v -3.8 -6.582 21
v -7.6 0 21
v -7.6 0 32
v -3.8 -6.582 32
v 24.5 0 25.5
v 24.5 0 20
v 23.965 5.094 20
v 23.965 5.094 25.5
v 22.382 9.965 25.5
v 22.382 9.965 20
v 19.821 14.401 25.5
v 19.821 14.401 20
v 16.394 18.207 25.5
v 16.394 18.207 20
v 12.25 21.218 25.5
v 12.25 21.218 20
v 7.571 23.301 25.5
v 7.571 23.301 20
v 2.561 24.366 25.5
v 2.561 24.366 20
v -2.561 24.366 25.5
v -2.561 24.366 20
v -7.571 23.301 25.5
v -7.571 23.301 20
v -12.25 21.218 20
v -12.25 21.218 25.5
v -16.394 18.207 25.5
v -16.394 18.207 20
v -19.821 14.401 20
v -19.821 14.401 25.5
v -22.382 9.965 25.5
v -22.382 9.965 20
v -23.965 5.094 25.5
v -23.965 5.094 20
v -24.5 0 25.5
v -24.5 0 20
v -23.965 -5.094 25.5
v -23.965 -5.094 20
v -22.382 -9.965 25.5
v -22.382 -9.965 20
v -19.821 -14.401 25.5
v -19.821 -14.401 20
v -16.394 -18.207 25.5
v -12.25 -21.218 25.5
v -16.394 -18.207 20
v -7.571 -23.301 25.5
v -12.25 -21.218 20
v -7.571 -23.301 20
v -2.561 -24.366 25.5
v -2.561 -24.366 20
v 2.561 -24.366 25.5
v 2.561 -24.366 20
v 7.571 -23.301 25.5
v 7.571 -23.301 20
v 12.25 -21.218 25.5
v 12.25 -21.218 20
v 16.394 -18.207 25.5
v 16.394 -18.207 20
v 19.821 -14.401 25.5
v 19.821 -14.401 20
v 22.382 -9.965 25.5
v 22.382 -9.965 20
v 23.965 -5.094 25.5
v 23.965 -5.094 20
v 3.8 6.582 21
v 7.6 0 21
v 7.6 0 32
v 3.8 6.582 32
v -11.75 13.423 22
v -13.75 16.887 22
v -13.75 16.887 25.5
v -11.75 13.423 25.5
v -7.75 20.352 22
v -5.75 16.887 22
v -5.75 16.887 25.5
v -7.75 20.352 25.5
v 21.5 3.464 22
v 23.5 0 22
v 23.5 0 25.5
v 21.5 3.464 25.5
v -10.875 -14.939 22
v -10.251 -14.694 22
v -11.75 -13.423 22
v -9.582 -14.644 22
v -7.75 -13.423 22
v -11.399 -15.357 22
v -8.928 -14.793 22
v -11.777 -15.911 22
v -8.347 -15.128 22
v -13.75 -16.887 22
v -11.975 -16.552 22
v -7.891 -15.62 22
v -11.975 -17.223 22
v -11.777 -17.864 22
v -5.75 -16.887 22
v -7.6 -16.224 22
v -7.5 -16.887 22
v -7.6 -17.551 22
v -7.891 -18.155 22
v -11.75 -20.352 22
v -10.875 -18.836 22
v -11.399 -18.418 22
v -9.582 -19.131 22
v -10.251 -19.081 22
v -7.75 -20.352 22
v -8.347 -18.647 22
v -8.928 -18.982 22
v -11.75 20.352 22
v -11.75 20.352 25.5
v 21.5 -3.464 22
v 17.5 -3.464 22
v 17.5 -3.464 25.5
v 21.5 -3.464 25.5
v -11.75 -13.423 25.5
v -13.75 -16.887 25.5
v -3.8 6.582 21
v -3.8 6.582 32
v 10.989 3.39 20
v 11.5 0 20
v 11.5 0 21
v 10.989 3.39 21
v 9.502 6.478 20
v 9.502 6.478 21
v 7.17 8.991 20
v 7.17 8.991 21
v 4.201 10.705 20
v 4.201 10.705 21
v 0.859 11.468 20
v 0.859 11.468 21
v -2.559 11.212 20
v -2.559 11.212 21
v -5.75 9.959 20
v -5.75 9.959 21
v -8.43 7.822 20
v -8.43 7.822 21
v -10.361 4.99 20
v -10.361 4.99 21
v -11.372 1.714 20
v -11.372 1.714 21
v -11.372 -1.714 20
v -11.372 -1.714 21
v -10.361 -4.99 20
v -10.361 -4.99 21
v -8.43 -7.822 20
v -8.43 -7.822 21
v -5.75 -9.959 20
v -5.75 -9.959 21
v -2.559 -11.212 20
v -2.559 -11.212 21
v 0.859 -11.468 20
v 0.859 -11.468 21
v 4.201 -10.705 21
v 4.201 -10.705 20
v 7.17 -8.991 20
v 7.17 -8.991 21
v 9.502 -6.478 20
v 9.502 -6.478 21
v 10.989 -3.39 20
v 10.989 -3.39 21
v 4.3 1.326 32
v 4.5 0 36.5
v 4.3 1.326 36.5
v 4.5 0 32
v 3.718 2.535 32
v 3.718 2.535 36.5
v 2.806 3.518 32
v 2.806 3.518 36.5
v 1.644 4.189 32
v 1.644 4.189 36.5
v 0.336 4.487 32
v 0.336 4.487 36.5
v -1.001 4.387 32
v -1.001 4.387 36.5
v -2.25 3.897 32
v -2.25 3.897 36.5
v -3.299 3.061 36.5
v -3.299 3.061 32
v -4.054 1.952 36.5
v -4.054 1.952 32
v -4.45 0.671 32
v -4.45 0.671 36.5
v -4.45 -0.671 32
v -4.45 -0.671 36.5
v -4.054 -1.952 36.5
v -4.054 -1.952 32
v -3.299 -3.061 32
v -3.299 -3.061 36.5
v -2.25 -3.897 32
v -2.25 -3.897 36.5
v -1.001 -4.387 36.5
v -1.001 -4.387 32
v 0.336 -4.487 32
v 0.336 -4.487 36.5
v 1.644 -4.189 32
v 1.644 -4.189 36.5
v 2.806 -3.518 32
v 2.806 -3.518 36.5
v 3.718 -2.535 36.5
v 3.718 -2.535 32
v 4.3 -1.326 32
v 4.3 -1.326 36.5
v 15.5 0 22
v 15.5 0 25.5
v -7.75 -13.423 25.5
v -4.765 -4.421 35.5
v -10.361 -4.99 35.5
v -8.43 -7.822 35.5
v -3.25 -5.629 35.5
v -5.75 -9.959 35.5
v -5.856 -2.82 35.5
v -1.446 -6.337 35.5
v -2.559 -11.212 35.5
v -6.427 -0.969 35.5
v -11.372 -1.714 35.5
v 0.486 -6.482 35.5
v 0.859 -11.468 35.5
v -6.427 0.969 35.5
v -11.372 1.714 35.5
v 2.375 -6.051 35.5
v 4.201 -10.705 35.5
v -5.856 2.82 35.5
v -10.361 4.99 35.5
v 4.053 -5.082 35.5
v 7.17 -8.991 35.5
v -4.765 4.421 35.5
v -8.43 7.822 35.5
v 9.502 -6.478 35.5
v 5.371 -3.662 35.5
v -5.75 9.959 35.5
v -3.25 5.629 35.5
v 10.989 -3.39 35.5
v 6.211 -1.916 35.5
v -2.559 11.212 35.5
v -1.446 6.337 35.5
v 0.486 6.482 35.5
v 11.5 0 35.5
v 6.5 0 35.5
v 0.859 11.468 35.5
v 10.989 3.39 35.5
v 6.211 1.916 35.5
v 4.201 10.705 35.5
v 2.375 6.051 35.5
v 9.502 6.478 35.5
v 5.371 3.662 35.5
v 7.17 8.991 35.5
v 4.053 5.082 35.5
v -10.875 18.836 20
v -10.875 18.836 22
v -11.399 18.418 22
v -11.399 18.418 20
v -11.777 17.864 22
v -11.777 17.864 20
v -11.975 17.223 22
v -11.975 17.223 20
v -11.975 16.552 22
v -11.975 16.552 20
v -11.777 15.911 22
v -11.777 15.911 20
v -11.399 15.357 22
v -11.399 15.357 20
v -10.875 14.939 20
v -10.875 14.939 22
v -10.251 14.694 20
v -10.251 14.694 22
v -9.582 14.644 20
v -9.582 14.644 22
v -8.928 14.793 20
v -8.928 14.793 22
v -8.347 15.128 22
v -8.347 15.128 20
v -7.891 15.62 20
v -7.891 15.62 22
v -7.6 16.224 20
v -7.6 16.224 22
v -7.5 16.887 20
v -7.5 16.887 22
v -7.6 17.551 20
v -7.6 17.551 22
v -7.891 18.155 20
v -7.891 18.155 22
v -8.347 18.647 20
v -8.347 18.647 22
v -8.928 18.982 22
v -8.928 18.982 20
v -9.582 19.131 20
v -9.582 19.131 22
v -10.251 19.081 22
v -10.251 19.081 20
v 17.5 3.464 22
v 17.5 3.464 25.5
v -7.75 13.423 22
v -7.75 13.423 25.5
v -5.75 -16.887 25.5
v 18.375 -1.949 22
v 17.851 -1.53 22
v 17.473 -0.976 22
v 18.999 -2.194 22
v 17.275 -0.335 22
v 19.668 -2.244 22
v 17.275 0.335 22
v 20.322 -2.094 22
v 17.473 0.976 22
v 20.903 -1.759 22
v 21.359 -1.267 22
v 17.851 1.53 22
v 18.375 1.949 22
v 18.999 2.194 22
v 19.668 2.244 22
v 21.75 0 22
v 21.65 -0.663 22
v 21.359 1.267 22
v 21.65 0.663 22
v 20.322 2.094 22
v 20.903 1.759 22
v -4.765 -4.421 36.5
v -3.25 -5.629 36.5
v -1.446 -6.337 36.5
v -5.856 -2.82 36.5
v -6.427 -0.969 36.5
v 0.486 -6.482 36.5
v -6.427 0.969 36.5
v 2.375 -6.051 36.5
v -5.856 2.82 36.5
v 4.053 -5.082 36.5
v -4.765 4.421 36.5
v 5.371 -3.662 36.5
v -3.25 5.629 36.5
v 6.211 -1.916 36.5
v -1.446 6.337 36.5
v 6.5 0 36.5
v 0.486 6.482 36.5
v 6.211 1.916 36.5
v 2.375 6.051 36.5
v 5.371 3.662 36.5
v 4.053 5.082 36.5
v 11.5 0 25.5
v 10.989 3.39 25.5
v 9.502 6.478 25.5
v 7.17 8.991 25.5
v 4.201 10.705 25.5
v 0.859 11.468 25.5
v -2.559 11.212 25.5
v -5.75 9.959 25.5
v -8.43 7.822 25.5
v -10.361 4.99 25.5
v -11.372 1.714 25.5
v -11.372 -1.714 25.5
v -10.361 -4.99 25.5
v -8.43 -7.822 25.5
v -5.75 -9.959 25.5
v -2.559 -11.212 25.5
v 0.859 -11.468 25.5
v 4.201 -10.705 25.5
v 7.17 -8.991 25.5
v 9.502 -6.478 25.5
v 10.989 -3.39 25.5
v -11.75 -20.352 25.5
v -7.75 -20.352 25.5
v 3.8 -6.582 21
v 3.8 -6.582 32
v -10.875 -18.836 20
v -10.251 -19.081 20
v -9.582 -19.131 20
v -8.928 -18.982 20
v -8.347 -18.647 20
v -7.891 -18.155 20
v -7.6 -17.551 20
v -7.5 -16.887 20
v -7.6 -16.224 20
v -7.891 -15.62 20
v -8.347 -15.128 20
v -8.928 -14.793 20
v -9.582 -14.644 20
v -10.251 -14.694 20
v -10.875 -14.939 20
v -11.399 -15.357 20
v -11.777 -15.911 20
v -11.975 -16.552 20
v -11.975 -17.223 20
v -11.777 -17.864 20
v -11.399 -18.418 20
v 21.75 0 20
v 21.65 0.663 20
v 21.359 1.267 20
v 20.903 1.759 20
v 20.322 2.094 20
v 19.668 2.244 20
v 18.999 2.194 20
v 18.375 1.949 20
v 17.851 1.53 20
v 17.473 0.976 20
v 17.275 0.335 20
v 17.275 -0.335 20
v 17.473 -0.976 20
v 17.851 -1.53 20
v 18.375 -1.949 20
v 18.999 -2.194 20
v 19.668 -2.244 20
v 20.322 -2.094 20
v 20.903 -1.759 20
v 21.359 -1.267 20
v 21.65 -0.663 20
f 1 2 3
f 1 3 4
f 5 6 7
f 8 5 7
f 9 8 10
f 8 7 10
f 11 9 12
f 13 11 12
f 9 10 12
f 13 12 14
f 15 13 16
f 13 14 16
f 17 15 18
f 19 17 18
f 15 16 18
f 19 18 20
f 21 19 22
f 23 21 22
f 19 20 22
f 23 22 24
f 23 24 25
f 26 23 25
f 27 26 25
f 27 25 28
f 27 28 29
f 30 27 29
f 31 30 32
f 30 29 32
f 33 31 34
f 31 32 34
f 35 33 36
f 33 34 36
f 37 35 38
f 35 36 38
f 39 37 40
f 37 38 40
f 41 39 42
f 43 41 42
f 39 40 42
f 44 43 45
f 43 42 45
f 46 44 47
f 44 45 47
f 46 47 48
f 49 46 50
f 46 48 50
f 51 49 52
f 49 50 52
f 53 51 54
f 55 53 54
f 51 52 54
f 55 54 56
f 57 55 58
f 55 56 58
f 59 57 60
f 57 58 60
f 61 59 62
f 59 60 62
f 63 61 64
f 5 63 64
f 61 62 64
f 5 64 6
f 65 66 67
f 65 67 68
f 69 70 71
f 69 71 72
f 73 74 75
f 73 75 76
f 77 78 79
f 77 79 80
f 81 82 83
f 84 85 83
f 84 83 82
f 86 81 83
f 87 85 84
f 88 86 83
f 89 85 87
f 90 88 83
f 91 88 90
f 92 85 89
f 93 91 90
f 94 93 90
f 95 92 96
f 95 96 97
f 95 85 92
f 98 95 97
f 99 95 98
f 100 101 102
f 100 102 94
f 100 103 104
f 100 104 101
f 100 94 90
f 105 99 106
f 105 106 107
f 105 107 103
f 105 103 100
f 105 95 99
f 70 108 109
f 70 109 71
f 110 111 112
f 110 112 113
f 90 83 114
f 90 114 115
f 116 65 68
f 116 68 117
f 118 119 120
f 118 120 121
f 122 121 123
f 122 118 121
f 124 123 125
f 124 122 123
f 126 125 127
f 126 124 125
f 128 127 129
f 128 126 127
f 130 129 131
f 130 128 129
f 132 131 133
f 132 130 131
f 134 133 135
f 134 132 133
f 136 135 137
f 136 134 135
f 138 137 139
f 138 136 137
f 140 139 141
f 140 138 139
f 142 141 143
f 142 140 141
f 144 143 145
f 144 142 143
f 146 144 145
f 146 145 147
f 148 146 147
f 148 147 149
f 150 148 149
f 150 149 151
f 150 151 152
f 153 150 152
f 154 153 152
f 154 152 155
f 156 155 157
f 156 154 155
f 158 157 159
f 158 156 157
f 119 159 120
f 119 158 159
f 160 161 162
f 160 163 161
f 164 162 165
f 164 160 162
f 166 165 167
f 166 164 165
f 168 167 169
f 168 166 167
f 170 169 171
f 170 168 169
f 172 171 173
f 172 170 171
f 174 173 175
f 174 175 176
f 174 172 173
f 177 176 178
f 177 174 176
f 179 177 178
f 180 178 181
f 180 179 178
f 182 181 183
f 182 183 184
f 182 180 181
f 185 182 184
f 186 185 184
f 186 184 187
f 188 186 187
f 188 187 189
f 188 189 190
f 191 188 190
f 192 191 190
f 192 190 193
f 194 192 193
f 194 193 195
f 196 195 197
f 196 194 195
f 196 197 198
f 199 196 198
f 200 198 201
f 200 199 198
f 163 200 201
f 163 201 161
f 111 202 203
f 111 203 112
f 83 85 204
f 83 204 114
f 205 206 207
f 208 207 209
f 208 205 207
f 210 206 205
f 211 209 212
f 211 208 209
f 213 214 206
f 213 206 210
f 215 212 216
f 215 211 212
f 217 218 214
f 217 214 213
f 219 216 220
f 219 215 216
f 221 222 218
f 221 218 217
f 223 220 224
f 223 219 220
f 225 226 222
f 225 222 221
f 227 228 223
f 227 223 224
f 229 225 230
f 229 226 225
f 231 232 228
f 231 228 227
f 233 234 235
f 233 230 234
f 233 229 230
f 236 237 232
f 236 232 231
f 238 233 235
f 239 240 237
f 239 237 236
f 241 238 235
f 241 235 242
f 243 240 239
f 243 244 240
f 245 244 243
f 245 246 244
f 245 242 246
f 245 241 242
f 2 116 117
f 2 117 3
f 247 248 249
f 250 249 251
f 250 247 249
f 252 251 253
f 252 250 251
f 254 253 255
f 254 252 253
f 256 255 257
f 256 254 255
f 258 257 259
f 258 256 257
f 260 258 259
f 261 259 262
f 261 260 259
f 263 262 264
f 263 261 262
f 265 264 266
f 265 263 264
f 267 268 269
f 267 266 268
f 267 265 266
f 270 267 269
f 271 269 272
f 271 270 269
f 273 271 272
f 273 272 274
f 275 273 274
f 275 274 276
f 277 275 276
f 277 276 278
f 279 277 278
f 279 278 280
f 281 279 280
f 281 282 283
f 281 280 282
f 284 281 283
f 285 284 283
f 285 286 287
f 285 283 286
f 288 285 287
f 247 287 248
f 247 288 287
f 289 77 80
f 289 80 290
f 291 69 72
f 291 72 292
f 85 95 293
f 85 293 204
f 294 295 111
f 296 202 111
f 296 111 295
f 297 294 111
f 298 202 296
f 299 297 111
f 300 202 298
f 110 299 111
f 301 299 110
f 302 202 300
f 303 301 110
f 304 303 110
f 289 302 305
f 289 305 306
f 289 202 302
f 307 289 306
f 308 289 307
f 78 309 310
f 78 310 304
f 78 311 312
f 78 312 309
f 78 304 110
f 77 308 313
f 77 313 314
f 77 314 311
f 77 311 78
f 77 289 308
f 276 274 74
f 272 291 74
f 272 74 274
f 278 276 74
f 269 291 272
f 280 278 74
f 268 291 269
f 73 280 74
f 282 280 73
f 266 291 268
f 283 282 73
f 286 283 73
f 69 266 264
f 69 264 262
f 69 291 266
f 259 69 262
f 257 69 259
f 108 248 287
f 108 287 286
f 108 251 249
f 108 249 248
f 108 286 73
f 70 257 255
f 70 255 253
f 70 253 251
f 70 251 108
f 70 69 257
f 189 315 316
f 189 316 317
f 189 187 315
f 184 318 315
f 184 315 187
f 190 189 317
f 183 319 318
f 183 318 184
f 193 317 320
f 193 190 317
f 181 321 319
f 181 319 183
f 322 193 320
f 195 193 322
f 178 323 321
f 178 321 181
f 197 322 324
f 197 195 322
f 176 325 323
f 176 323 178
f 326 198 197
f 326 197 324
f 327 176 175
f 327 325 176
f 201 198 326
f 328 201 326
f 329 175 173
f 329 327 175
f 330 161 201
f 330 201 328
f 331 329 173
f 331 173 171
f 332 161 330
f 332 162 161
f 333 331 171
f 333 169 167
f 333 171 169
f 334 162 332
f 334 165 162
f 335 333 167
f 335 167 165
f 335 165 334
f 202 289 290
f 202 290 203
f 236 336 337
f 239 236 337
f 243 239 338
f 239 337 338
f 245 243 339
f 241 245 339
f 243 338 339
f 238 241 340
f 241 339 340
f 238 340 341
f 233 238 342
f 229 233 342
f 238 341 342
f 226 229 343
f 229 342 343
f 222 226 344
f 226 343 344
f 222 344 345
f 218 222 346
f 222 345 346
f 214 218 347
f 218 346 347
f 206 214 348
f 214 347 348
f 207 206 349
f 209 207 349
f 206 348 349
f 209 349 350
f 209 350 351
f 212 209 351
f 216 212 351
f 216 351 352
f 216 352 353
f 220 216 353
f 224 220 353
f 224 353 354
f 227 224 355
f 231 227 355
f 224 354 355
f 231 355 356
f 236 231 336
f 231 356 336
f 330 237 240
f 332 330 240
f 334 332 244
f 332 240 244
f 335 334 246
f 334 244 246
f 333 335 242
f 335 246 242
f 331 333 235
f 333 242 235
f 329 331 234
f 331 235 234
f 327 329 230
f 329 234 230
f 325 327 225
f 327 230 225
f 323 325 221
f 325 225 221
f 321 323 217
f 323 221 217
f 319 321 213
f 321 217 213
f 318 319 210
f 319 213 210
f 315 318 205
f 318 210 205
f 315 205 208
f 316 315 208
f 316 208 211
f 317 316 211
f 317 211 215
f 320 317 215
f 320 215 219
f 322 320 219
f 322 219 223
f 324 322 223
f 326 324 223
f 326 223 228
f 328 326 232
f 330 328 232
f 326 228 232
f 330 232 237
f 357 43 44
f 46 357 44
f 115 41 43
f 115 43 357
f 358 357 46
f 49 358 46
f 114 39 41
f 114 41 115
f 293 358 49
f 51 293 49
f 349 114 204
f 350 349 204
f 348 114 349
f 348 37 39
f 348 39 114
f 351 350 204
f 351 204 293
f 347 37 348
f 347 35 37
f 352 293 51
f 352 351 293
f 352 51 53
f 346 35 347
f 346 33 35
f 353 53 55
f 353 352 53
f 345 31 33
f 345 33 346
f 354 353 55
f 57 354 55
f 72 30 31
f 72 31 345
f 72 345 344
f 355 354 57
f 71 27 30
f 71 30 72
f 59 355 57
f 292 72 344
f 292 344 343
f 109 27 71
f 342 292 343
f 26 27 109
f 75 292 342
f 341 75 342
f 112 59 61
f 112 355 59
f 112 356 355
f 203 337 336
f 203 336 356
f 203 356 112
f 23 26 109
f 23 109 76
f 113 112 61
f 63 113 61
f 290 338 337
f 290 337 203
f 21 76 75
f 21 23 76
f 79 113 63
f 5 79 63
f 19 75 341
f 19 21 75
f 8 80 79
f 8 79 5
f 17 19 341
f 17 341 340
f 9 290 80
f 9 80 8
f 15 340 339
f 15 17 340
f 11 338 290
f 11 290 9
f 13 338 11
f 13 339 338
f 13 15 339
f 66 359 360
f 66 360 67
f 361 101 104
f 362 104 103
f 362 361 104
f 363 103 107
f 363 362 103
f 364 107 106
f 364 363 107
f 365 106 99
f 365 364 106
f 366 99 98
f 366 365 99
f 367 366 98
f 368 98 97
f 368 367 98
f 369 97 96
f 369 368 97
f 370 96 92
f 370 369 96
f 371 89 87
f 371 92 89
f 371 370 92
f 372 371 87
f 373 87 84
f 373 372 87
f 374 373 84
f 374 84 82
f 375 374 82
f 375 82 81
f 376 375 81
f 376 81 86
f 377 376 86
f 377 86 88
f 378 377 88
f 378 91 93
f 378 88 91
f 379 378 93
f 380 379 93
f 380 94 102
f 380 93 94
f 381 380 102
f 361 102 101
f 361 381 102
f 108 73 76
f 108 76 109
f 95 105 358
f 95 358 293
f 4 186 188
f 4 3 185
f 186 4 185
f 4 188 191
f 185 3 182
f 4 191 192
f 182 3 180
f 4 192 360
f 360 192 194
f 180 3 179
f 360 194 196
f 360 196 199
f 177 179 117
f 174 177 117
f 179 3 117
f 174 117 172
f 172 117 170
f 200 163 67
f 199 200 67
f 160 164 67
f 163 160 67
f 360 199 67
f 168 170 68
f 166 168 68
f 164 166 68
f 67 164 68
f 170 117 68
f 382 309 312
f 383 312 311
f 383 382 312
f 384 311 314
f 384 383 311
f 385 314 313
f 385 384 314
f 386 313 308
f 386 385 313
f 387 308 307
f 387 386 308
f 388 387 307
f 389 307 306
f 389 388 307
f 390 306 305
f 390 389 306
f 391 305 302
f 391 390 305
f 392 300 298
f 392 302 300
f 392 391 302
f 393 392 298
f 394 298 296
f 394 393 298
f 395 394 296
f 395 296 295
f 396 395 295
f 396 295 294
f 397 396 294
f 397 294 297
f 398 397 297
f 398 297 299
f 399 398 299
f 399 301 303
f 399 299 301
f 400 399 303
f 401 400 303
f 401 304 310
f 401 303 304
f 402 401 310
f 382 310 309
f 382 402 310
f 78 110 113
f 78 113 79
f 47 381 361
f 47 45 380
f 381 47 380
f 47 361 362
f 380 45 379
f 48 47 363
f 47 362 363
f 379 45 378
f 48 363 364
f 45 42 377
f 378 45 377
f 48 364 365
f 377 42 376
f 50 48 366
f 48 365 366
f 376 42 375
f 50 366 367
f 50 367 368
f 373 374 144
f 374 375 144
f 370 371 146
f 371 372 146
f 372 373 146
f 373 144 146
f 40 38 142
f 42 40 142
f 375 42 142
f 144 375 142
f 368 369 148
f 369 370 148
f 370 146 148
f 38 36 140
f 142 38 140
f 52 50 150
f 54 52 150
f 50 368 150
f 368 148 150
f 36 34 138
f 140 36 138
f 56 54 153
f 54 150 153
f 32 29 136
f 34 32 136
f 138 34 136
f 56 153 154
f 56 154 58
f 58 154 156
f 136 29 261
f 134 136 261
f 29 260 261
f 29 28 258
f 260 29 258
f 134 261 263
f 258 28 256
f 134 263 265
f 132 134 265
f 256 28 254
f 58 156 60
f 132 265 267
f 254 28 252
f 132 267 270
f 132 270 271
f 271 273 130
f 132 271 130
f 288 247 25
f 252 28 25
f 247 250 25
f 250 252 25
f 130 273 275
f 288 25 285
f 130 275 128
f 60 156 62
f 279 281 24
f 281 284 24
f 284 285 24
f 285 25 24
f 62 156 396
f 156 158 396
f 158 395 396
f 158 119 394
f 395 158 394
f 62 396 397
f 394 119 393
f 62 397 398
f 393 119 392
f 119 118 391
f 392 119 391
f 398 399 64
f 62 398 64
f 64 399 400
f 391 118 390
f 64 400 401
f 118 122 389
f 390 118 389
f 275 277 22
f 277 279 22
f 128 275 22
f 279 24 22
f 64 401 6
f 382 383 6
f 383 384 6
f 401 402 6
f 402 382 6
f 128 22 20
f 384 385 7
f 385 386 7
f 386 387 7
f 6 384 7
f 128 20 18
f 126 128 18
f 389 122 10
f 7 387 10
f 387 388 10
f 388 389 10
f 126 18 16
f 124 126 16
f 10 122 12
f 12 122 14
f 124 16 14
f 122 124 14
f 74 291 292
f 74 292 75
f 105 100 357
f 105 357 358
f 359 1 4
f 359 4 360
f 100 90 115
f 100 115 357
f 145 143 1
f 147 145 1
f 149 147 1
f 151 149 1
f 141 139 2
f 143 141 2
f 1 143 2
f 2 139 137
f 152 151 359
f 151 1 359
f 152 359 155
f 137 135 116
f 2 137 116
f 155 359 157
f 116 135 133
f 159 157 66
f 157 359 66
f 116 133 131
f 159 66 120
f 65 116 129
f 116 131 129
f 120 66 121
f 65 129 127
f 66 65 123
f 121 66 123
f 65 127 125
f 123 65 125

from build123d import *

# Parameters (mm, degrees)
TUBE_R            = 6.5
TUBE_R_2          = 4.5
TUBE_DEPTH        = 1
PAD001_DEPTH      = 12
CYLINDER018_R     = 4.5
CYLINDER018_DEPTH = 500
CYLINDER012_R     = 11.5
CYLINDER012_DEPTH = 1
PAD_DEPTH         = 3.5
CYLINDER011_R     = 2.25
CYLINDER011_DEPTH = 10
ARRAY002_COUNT    = 3
CYLINDER010_R     = 24.5
CYLINDER010_DEPTH = 5.5
CYLINDER013_R     = 11.5
CYLINDER013_DEPTH = 10


with BuildPart() as tube:
    # Tube → Tube (new body)
    with BuildSketch(Plane.XY.offset(35.5)):
        Circle(TUBE_R)
        Circle(TUBE_R_2, mode=Mode.SUBTRACT)
    extrude(amount=TUBE_DEPTH)


with BuildPart() as pressfitm8:
    # Sketch001 → Pad001 (new body)
    with BuildSketch(Plane.XY):
        Polygon((7.6, 0), (3.8, 6.581793), (-3.8, 6.581793), (-7.6, 0), (-3.8, -6.581793), (3.8, -6.581793), align=None)
    extrude(amount=PAD001_DEPTH)


with BuildPart() as pressfitm8_1:
    # Body001 placement: moved
    add(pressfitm8.part.moved(Location((0, 0, 20))))


with BuildPart() as fusion007:
    # Cylinder018 → Cylinder018 (new body)
    with BuildSketch(Plane.XY):
        Circle(CYLINDER018_R)
    extrude(amount=CYLINDER018_DEPTH)

    # Fusion007: union PressfitM8
    add(pressfitm8_1.part)


with BuildPart() as cylinder012:
    # Cylinder012 → Cylinder012 (new body)
    with BuildSketch(Plane.XY.offset(20)):
        Circle(CYLINDER012_R)
    extrude(amount=CYLINDER012_DEPTH)


with BuildPart() as pressfitm4:
    # Sketch → Pad (new body)
    with BuildSketch(Plane.XY):
        Polygon((4, 0), (2, 3.464102), (-2, 3.464102), (-4, 0), (-2, -3.464102), (2, -3.464102), align=None)
    extrude(amount=PAD_DEPTH)


with BuildPart() as pressfitm4_1:
    # Body placement: moved
    add(pressfitm4.part.moved(Location((19.5, 0, 22))))


with BuildPart() as array002:
    # Cylinder011 → Cylinder011 (new body)
    with BuildSketch(Plane(origin=(19.5, 0, 20), x_dir=(1, 0, 0), z_dir=(0, 0, 1))):
        Circle(CYLINDER011_R)
    extrude(amount=CYLINDER011_DEPTH)

    # Fusion003: union PressfitM4
    add(pressfitm4_1.part)

    # Array002: Array002 ×3 about axis
    array002_axis = Axis((0, 0, 0), (0, 0, 1))


with BuildPart() as array002_1:
    add(array002.part)
    for i in range(1, ARRAY002_COUNT):
        add(array002.part.rotate(array002_axis, i * 360 / ARRAY002_COUNT))


with BuildPart() as cut006:
    # Cylinder010 → Cylinder010 (new body)
    with BuildSketch(Plane.XY.offset(20)):
        Circle(CYLINDER010_R)
    extrude(amount=CYLINDER010_DEPTH)

    # Cut005: cut Array002
    add(array002_1.part, mode=Mode.SUBTRACT)

    # Cut006: cut Cylinder012
    add(cylinder012.part, mode=Mode.SUBTRACT)


with BuildPart() as finalplanetcarrier:
    # Cylinder013 → Cylinder013 (new body)
    with BuildSketch(Plane.XY.offset(25.5)):
        Circle(CYLINDER013_R)
    extrude(amount=CYLINDER013_DEPTH)

    # Fusion008: union Cut006
    add(cut006.part)

    # Cut008: cut Fusion007
    add(fusion007.part, mode=Mode.SUBTRACT)

    # Fusion009: union Tube
    add(tube.part)


solid = finalplanetcarrier.part
